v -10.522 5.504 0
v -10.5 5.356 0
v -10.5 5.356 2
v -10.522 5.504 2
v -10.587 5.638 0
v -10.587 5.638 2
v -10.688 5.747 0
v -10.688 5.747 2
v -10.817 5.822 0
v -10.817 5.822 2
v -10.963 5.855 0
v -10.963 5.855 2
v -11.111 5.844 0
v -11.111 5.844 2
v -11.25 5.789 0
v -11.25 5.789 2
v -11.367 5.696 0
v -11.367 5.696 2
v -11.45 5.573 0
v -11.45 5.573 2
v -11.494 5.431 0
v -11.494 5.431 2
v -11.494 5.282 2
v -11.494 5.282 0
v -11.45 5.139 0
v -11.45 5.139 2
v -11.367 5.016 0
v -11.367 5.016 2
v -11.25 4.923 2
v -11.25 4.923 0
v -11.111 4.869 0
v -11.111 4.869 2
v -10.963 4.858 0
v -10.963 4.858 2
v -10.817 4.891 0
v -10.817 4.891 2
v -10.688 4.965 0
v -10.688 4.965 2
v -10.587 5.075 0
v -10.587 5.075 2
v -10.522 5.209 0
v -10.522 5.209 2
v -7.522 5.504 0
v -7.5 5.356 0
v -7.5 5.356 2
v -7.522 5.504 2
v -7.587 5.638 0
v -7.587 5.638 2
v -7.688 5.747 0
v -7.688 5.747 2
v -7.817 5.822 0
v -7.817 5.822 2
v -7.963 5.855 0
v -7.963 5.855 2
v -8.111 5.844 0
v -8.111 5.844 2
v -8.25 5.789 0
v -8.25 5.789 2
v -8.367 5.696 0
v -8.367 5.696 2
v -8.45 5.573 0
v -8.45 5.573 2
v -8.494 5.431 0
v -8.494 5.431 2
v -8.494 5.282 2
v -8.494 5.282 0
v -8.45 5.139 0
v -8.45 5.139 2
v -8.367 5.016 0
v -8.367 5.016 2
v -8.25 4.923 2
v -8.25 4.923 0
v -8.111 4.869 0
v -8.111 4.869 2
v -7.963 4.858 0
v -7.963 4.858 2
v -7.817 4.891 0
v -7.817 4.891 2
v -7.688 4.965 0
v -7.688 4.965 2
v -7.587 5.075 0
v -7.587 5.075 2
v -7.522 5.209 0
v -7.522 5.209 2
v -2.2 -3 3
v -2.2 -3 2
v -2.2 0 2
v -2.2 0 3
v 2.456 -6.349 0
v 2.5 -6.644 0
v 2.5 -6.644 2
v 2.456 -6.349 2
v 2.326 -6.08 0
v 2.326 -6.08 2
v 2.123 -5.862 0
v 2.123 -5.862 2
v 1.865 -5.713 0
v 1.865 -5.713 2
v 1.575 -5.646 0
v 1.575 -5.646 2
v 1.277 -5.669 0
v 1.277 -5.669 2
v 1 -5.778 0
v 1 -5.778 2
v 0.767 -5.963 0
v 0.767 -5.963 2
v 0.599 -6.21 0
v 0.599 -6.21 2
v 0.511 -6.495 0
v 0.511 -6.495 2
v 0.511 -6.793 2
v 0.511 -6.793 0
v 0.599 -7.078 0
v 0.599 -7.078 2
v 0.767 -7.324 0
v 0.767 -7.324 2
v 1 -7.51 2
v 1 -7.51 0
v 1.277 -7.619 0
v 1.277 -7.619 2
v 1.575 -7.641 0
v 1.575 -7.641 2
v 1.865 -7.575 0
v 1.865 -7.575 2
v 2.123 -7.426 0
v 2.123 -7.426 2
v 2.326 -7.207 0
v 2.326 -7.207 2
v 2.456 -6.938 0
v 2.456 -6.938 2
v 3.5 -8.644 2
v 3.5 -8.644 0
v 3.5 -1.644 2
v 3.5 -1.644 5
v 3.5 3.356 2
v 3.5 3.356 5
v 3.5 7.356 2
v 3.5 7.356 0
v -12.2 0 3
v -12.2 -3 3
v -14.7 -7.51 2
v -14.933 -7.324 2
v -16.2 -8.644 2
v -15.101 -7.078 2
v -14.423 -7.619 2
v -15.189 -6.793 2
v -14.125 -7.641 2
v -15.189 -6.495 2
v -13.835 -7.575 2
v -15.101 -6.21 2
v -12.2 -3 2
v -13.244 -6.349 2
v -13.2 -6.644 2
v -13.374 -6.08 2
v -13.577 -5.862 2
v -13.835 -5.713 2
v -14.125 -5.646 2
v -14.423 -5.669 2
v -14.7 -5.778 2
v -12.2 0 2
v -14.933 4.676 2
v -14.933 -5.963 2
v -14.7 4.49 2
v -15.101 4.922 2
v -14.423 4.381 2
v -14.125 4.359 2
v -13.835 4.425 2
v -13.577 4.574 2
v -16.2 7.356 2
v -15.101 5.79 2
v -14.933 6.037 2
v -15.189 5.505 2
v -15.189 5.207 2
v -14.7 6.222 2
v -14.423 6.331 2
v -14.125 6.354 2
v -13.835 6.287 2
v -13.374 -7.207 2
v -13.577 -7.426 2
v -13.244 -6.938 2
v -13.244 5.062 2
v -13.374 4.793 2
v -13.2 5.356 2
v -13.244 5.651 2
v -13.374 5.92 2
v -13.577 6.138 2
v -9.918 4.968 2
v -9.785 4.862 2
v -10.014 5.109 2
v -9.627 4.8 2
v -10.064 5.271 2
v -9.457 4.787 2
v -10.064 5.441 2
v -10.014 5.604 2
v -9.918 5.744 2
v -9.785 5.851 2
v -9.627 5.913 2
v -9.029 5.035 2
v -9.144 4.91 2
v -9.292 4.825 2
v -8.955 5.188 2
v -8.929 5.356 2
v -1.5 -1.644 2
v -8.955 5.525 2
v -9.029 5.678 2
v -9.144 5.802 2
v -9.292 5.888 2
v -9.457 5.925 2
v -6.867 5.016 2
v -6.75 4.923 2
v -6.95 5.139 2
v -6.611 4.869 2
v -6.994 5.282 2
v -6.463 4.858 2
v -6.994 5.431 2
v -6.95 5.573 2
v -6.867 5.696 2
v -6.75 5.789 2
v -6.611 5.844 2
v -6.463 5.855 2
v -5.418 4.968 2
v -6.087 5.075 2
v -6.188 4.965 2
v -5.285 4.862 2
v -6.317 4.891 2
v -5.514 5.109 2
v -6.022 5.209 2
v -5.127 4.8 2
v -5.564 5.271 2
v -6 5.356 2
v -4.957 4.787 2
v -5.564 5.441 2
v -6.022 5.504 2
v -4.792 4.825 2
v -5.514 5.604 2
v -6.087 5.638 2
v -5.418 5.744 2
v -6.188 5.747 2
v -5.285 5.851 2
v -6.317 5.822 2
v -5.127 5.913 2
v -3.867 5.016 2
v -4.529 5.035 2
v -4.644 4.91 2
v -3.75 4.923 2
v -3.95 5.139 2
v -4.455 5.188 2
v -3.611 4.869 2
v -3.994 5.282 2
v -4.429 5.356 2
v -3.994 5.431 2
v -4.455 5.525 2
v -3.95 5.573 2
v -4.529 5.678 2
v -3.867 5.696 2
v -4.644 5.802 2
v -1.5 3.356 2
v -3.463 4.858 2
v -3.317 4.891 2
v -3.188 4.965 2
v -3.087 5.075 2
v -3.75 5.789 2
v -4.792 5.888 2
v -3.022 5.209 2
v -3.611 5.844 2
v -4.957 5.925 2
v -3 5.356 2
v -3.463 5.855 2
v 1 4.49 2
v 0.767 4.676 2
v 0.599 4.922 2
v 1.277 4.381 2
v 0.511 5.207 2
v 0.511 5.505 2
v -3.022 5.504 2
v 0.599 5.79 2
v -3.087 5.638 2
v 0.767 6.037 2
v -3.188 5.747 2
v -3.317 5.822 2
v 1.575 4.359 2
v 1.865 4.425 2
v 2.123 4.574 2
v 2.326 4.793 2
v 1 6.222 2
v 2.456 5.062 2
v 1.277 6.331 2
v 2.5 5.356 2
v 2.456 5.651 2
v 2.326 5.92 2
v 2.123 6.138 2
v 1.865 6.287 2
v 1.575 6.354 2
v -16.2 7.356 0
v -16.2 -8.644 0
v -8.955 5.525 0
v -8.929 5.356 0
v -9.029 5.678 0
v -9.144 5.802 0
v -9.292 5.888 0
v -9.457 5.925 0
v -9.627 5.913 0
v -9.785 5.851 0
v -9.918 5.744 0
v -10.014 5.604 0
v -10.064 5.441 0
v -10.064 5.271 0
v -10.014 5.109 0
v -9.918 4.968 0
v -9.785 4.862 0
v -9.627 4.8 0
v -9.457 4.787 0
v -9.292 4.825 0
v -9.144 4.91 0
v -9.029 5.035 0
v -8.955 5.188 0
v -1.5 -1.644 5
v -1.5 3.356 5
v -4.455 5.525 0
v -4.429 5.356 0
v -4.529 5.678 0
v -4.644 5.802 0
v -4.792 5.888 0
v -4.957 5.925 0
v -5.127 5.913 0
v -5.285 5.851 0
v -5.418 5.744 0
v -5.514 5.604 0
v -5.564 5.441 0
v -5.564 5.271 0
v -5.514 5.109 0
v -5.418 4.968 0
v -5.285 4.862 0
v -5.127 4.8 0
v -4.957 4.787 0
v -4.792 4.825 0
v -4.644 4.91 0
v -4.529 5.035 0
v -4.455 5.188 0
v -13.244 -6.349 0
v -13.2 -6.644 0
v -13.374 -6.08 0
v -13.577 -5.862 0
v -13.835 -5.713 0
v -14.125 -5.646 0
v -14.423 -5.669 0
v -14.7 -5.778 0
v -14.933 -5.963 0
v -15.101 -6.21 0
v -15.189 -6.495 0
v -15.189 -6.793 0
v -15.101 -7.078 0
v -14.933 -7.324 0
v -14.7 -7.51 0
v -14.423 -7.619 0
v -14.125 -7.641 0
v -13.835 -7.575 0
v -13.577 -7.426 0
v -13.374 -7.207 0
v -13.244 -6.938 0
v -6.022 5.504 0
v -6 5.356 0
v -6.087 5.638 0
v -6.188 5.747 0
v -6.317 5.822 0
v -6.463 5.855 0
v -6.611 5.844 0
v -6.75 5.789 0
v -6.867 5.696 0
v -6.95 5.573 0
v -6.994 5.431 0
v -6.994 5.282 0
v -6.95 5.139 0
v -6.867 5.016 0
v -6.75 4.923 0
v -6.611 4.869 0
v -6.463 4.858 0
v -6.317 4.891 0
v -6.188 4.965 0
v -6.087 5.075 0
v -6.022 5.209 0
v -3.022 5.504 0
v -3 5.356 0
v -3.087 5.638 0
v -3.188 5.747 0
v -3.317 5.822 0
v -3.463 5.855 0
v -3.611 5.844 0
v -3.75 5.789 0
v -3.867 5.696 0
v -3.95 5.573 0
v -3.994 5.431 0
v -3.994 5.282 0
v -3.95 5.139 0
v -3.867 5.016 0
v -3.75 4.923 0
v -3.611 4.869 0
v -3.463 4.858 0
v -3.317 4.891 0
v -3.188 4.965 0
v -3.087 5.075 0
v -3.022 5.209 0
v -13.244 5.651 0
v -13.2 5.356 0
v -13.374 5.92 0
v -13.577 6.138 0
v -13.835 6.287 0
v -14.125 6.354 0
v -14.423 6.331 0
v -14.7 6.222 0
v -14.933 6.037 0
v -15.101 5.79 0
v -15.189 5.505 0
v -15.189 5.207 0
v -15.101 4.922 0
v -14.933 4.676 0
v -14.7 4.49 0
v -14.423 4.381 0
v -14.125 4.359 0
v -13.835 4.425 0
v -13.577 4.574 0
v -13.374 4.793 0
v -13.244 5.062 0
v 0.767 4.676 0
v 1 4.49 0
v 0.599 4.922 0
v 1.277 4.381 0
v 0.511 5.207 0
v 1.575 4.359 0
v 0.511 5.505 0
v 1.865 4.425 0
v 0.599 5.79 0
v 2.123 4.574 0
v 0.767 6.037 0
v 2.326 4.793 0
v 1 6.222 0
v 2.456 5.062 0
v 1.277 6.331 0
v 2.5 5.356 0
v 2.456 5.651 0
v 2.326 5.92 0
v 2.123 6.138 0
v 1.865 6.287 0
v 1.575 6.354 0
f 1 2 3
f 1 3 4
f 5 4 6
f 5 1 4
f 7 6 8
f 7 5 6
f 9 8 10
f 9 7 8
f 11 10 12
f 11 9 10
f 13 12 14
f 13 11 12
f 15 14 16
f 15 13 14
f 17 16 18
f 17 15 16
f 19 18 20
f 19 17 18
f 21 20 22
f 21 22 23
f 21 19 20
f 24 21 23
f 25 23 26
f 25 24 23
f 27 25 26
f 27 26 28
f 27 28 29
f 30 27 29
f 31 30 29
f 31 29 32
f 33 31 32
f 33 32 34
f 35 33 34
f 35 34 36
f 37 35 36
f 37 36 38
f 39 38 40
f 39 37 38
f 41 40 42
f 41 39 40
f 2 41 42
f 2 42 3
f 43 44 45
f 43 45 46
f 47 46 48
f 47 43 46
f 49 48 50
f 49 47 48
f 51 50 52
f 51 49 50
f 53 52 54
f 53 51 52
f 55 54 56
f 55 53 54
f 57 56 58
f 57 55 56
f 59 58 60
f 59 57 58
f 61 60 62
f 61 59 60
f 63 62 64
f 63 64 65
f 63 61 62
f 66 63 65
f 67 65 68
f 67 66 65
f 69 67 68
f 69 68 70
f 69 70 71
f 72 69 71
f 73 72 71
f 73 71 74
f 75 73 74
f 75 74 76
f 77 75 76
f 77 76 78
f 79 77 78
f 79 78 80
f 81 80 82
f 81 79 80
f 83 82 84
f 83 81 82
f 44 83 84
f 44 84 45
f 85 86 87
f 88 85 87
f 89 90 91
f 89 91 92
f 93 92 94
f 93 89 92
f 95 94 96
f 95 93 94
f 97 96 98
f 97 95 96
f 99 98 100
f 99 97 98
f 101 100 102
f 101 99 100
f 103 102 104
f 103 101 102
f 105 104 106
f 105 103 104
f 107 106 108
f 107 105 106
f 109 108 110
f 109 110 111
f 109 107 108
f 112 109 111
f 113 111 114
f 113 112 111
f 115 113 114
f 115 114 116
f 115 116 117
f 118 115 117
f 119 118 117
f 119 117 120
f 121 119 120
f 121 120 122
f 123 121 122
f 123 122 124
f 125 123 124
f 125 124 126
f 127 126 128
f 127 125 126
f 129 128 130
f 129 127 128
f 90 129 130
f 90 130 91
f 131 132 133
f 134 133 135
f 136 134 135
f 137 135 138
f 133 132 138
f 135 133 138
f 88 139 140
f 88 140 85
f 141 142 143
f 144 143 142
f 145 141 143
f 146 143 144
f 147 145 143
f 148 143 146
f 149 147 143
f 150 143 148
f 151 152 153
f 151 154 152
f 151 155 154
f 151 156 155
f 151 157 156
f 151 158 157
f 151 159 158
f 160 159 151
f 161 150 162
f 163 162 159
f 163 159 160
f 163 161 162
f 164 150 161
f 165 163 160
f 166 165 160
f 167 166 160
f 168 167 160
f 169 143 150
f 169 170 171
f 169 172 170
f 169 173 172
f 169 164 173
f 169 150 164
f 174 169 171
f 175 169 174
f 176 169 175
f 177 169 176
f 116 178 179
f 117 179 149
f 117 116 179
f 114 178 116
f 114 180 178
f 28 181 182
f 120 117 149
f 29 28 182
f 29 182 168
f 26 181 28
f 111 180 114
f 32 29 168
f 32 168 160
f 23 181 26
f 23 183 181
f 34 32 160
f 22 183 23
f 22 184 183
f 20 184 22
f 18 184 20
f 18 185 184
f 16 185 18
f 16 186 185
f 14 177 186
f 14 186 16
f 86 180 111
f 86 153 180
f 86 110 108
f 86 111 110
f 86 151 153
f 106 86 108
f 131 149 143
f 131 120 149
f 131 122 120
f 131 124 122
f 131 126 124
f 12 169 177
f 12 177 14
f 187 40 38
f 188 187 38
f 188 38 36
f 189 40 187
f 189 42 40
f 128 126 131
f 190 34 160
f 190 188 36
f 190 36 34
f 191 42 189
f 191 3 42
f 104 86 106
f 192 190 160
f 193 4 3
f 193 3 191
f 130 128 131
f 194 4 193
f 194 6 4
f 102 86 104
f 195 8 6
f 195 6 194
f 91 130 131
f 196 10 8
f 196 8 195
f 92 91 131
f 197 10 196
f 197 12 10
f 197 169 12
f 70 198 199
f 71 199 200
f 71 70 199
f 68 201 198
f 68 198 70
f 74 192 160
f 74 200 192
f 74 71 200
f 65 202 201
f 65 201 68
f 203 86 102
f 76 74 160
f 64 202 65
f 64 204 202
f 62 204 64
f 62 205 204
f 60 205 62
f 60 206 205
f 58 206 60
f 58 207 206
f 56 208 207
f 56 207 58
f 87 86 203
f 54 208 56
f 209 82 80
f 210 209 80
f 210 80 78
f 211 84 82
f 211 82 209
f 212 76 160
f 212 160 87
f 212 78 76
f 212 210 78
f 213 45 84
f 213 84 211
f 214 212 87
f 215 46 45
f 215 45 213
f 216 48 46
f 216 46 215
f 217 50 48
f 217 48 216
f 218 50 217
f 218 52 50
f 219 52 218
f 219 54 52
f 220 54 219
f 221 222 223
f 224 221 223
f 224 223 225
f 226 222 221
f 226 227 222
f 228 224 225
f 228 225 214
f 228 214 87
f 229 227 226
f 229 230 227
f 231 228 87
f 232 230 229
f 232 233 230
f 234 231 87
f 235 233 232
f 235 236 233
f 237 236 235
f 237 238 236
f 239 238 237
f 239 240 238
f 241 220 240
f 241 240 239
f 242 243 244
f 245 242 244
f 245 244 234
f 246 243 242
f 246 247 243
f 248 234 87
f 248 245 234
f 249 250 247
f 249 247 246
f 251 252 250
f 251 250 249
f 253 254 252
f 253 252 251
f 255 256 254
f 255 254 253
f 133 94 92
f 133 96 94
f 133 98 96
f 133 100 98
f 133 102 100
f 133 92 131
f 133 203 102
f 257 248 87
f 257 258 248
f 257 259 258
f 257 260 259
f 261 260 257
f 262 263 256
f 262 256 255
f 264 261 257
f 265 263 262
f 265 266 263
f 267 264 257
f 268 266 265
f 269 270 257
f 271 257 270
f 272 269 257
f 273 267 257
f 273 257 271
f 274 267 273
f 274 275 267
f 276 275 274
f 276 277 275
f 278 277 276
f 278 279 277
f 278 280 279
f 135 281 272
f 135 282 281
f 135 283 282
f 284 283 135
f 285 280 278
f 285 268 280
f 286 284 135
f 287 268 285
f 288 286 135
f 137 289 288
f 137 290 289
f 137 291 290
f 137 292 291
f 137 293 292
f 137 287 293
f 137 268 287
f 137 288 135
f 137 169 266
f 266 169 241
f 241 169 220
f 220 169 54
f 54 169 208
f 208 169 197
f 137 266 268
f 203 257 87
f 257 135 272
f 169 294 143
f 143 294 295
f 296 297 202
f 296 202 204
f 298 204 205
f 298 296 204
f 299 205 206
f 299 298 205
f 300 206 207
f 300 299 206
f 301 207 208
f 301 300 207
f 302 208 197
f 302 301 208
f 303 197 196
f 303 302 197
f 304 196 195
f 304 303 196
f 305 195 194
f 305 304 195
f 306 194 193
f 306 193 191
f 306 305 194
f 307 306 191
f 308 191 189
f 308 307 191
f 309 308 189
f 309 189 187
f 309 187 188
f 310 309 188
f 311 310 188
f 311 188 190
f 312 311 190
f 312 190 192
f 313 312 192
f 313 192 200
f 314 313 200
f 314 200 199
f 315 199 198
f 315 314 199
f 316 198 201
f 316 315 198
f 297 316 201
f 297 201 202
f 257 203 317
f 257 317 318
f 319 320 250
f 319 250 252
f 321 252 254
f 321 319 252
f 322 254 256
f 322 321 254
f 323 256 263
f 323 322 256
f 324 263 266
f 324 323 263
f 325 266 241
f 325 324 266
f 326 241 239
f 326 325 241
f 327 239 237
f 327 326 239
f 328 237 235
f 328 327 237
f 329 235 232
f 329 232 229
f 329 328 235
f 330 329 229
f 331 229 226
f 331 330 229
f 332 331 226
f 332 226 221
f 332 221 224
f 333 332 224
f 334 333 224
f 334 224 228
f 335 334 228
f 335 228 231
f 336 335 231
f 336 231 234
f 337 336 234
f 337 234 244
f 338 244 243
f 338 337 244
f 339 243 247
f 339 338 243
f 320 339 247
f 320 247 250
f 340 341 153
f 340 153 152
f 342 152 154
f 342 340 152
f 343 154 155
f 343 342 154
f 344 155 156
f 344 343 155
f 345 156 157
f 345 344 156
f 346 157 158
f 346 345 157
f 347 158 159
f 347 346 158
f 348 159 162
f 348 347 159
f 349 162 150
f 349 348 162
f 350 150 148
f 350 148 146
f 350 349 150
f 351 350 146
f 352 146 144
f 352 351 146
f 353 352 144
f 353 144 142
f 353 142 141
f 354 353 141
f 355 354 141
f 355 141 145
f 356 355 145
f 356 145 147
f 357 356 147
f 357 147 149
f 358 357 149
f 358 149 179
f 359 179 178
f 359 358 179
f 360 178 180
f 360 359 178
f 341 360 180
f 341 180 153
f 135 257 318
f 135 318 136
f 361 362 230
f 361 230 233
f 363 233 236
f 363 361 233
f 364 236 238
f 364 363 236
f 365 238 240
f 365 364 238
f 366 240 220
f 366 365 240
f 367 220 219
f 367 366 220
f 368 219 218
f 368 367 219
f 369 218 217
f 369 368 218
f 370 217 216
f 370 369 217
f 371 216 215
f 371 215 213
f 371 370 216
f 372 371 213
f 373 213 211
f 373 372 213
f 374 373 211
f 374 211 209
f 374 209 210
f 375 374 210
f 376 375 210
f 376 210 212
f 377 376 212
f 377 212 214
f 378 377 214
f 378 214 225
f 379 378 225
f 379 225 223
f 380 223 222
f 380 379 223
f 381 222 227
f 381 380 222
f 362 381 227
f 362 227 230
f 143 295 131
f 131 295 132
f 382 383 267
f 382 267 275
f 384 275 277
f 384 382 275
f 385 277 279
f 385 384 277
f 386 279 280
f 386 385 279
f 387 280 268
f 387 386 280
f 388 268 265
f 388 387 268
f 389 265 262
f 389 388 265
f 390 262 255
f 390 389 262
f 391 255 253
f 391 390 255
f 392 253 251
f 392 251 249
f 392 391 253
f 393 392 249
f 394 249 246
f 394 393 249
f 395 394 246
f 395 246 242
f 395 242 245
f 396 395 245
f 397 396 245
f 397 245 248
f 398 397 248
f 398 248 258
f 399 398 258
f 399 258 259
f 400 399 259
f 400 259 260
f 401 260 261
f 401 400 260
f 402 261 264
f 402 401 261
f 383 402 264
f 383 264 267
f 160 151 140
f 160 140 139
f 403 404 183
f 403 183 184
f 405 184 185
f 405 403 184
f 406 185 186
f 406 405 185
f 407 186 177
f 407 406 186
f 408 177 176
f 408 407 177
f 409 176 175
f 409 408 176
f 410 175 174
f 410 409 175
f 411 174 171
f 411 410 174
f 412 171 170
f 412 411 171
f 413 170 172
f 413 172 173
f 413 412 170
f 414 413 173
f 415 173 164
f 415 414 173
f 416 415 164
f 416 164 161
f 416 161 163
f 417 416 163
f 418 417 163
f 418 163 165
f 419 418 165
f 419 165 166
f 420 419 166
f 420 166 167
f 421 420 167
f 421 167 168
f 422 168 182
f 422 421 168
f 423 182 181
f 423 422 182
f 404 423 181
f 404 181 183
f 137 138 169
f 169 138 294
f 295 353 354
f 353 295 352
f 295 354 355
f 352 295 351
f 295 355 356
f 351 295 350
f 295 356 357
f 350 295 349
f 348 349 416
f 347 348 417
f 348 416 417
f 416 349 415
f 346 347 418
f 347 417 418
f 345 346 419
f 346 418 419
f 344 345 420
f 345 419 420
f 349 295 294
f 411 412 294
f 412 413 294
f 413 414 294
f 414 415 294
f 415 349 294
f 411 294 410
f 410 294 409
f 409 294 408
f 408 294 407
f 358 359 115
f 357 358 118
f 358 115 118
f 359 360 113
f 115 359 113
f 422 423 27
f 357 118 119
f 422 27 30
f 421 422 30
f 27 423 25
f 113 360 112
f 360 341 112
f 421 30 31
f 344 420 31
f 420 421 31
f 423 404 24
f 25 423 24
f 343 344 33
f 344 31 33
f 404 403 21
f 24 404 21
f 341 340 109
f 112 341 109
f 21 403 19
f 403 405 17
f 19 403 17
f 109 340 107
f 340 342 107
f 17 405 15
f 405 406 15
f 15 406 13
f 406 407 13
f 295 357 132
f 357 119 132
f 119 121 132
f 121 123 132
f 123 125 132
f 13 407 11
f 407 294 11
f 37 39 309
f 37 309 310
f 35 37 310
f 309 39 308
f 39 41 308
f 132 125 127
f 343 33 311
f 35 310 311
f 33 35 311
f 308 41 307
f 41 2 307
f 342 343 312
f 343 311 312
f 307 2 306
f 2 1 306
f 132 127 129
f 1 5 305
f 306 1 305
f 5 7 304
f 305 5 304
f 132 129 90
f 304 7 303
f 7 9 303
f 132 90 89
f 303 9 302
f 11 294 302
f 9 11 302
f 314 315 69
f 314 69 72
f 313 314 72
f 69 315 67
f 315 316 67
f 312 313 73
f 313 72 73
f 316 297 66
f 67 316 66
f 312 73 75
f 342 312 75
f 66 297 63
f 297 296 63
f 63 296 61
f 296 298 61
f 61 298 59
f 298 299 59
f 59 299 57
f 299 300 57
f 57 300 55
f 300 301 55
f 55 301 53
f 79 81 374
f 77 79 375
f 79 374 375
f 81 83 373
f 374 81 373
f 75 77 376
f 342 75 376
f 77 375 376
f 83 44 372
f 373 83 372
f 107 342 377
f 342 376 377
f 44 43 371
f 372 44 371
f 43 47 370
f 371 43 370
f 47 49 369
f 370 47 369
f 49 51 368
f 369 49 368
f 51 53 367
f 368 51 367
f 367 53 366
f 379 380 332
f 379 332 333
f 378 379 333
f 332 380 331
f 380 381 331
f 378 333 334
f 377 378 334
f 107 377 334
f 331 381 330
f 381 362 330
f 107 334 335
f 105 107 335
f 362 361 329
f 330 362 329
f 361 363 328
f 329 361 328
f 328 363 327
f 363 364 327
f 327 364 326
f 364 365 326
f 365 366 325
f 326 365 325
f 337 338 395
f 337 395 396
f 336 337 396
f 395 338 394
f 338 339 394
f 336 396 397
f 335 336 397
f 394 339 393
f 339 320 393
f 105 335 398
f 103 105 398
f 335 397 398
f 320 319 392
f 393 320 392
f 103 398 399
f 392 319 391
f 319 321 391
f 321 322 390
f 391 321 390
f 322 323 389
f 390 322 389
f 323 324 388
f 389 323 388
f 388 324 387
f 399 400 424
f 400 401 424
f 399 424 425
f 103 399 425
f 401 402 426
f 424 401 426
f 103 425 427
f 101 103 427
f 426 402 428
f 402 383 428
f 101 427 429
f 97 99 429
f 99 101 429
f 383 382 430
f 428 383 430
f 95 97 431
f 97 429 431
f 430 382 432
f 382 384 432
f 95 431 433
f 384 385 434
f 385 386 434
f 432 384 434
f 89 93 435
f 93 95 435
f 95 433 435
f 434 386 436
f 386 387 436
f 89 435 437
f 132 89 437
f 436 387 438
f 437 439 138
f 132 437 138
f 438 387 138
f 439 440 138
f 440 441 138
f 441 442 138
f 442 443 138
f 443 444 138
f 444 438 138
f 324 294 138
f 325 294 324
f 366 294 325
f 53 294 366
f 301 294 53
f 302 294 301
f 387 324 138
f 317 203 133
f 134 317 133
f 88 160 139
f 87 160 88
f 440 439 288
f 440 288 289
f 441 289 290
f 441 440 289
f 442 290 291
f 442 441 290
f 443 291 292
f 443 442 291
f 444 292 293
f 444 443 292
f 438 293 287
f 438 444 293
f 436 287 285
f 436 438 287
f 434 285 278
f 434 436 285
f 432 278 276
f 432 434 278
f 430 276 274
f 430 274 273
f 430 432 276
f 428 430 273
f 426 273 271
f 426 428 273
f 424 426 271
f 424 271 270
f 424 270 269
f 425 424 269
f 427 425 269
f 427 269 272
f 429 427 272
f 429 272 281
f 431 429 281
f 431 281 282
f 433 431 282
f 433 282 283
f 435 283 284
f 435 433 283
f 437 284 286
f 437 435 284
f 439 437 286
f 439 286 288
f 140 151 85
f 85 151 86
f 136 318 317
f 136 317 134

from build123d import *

# Parameters (mm, degrees)
SKETCH1_R           = 1
SKETCH1_W           = 10
SKETCH1_H           = 3
SKETCH1_R_2         = 0.5
SKETCH1_R_3         = 0.5706303
BOSS_EXTRUDE1_DEPTH = 2
SKETCH1_3_W         = 5
SKETCH1_3_H         = 5
BOSS_EXTRUDE2_DEPTH = 5
SKETCH1_4_W         = 10
SKETCH1_4_H         = 3
BOSS_EXTRUDE3_DEPTH = 3


with BuildPart() as part:
    # Sketch1 → Boss-Extrude1 (new body)
    with BuildSketch(Plane.XY):
        Polygon((3.5, 7.35633001), (-16.2, 7.35633001), (-16.2, -8.64366999), (-11.2, -8.64366999), (-1.5, -8.64366999), (3.5, -8.64366999), (3.5, -1.64366999), (-1.5, -1.64366999), (-1.5, 3.35633001), (3.5, 3.35633001), align=None)
        with Locations((-14.2, -6.64366999)):
            Circle(SKETCH1_R, mode=Mode.SUBTRACT)
        with Locations((-7.2, -1.5)):
            Rectangle(SKETCH1_W, SKETCH1_H, mode=Mode.SUBTRACT)
        with Locations((1.5, -6.64366999)):
            Circle(SKETCH1_R, mode=Mode.SUBTRACT)
        with Locations((-14.2, 5.35633001)):
            Circle(SKETCH1_R, mode=Mode.SUBTRACT)
        with Locations((-11, 5.35633001)):
            Circle(SKETCH1_R_2, mode=Mode.SUBTRACT)
        with Locations((-9.5, 5.35633001)):
            Circle(SKETCH1_R_3, mode=Mode.SUBTRACT)
        with Locations((-8, 5.35633001)):
            Circle(SKETCH1_R_2, mode=Mode.SUBTRACT)
        with Locations((-6.5, 5.35633001)):
            Circle(SKETCH1_R_2, mode=Mode.SUBTRACT)
        with Locations((-5, 5.35633001)):
            Circle(SKETCH1_R_3, mode=Mode.SUBTRACT)
        with Locations((-3.5, 5.35633001)):
            Circle(SKETCH1_R_2, mode=Mode.SUBTRACT)
        with Locations((1.5, 5.35633001)):
            Circle(SKETCH1_R, mode=Mode.SUBTRACT)
    extrude(amount=BOSS_EXTRUDE1_DEPTH)

    # Sketch1<3> → Boss-Extrude2 (add)
    with BuildSketch(Plane.XY):
        with Locations((1, 0.85633001)):
            Rectangle(SKETCH1_3_W, SKETCH1_3_H)
    extrude(amount=BOSS_EXTRUDE2_DEPTH)

    # Sketch1<4> → Boss-Extrude3 (add)
    with BuildSketch(Plane.XY):
        with Locations((-7.2, -1.5)):
            Rectangle(SKETCH1_4_W, SKETCH1_4_H)
    extrude(amount=BOSS_EXTRUDE3_DEPTH)


solid = part.part
